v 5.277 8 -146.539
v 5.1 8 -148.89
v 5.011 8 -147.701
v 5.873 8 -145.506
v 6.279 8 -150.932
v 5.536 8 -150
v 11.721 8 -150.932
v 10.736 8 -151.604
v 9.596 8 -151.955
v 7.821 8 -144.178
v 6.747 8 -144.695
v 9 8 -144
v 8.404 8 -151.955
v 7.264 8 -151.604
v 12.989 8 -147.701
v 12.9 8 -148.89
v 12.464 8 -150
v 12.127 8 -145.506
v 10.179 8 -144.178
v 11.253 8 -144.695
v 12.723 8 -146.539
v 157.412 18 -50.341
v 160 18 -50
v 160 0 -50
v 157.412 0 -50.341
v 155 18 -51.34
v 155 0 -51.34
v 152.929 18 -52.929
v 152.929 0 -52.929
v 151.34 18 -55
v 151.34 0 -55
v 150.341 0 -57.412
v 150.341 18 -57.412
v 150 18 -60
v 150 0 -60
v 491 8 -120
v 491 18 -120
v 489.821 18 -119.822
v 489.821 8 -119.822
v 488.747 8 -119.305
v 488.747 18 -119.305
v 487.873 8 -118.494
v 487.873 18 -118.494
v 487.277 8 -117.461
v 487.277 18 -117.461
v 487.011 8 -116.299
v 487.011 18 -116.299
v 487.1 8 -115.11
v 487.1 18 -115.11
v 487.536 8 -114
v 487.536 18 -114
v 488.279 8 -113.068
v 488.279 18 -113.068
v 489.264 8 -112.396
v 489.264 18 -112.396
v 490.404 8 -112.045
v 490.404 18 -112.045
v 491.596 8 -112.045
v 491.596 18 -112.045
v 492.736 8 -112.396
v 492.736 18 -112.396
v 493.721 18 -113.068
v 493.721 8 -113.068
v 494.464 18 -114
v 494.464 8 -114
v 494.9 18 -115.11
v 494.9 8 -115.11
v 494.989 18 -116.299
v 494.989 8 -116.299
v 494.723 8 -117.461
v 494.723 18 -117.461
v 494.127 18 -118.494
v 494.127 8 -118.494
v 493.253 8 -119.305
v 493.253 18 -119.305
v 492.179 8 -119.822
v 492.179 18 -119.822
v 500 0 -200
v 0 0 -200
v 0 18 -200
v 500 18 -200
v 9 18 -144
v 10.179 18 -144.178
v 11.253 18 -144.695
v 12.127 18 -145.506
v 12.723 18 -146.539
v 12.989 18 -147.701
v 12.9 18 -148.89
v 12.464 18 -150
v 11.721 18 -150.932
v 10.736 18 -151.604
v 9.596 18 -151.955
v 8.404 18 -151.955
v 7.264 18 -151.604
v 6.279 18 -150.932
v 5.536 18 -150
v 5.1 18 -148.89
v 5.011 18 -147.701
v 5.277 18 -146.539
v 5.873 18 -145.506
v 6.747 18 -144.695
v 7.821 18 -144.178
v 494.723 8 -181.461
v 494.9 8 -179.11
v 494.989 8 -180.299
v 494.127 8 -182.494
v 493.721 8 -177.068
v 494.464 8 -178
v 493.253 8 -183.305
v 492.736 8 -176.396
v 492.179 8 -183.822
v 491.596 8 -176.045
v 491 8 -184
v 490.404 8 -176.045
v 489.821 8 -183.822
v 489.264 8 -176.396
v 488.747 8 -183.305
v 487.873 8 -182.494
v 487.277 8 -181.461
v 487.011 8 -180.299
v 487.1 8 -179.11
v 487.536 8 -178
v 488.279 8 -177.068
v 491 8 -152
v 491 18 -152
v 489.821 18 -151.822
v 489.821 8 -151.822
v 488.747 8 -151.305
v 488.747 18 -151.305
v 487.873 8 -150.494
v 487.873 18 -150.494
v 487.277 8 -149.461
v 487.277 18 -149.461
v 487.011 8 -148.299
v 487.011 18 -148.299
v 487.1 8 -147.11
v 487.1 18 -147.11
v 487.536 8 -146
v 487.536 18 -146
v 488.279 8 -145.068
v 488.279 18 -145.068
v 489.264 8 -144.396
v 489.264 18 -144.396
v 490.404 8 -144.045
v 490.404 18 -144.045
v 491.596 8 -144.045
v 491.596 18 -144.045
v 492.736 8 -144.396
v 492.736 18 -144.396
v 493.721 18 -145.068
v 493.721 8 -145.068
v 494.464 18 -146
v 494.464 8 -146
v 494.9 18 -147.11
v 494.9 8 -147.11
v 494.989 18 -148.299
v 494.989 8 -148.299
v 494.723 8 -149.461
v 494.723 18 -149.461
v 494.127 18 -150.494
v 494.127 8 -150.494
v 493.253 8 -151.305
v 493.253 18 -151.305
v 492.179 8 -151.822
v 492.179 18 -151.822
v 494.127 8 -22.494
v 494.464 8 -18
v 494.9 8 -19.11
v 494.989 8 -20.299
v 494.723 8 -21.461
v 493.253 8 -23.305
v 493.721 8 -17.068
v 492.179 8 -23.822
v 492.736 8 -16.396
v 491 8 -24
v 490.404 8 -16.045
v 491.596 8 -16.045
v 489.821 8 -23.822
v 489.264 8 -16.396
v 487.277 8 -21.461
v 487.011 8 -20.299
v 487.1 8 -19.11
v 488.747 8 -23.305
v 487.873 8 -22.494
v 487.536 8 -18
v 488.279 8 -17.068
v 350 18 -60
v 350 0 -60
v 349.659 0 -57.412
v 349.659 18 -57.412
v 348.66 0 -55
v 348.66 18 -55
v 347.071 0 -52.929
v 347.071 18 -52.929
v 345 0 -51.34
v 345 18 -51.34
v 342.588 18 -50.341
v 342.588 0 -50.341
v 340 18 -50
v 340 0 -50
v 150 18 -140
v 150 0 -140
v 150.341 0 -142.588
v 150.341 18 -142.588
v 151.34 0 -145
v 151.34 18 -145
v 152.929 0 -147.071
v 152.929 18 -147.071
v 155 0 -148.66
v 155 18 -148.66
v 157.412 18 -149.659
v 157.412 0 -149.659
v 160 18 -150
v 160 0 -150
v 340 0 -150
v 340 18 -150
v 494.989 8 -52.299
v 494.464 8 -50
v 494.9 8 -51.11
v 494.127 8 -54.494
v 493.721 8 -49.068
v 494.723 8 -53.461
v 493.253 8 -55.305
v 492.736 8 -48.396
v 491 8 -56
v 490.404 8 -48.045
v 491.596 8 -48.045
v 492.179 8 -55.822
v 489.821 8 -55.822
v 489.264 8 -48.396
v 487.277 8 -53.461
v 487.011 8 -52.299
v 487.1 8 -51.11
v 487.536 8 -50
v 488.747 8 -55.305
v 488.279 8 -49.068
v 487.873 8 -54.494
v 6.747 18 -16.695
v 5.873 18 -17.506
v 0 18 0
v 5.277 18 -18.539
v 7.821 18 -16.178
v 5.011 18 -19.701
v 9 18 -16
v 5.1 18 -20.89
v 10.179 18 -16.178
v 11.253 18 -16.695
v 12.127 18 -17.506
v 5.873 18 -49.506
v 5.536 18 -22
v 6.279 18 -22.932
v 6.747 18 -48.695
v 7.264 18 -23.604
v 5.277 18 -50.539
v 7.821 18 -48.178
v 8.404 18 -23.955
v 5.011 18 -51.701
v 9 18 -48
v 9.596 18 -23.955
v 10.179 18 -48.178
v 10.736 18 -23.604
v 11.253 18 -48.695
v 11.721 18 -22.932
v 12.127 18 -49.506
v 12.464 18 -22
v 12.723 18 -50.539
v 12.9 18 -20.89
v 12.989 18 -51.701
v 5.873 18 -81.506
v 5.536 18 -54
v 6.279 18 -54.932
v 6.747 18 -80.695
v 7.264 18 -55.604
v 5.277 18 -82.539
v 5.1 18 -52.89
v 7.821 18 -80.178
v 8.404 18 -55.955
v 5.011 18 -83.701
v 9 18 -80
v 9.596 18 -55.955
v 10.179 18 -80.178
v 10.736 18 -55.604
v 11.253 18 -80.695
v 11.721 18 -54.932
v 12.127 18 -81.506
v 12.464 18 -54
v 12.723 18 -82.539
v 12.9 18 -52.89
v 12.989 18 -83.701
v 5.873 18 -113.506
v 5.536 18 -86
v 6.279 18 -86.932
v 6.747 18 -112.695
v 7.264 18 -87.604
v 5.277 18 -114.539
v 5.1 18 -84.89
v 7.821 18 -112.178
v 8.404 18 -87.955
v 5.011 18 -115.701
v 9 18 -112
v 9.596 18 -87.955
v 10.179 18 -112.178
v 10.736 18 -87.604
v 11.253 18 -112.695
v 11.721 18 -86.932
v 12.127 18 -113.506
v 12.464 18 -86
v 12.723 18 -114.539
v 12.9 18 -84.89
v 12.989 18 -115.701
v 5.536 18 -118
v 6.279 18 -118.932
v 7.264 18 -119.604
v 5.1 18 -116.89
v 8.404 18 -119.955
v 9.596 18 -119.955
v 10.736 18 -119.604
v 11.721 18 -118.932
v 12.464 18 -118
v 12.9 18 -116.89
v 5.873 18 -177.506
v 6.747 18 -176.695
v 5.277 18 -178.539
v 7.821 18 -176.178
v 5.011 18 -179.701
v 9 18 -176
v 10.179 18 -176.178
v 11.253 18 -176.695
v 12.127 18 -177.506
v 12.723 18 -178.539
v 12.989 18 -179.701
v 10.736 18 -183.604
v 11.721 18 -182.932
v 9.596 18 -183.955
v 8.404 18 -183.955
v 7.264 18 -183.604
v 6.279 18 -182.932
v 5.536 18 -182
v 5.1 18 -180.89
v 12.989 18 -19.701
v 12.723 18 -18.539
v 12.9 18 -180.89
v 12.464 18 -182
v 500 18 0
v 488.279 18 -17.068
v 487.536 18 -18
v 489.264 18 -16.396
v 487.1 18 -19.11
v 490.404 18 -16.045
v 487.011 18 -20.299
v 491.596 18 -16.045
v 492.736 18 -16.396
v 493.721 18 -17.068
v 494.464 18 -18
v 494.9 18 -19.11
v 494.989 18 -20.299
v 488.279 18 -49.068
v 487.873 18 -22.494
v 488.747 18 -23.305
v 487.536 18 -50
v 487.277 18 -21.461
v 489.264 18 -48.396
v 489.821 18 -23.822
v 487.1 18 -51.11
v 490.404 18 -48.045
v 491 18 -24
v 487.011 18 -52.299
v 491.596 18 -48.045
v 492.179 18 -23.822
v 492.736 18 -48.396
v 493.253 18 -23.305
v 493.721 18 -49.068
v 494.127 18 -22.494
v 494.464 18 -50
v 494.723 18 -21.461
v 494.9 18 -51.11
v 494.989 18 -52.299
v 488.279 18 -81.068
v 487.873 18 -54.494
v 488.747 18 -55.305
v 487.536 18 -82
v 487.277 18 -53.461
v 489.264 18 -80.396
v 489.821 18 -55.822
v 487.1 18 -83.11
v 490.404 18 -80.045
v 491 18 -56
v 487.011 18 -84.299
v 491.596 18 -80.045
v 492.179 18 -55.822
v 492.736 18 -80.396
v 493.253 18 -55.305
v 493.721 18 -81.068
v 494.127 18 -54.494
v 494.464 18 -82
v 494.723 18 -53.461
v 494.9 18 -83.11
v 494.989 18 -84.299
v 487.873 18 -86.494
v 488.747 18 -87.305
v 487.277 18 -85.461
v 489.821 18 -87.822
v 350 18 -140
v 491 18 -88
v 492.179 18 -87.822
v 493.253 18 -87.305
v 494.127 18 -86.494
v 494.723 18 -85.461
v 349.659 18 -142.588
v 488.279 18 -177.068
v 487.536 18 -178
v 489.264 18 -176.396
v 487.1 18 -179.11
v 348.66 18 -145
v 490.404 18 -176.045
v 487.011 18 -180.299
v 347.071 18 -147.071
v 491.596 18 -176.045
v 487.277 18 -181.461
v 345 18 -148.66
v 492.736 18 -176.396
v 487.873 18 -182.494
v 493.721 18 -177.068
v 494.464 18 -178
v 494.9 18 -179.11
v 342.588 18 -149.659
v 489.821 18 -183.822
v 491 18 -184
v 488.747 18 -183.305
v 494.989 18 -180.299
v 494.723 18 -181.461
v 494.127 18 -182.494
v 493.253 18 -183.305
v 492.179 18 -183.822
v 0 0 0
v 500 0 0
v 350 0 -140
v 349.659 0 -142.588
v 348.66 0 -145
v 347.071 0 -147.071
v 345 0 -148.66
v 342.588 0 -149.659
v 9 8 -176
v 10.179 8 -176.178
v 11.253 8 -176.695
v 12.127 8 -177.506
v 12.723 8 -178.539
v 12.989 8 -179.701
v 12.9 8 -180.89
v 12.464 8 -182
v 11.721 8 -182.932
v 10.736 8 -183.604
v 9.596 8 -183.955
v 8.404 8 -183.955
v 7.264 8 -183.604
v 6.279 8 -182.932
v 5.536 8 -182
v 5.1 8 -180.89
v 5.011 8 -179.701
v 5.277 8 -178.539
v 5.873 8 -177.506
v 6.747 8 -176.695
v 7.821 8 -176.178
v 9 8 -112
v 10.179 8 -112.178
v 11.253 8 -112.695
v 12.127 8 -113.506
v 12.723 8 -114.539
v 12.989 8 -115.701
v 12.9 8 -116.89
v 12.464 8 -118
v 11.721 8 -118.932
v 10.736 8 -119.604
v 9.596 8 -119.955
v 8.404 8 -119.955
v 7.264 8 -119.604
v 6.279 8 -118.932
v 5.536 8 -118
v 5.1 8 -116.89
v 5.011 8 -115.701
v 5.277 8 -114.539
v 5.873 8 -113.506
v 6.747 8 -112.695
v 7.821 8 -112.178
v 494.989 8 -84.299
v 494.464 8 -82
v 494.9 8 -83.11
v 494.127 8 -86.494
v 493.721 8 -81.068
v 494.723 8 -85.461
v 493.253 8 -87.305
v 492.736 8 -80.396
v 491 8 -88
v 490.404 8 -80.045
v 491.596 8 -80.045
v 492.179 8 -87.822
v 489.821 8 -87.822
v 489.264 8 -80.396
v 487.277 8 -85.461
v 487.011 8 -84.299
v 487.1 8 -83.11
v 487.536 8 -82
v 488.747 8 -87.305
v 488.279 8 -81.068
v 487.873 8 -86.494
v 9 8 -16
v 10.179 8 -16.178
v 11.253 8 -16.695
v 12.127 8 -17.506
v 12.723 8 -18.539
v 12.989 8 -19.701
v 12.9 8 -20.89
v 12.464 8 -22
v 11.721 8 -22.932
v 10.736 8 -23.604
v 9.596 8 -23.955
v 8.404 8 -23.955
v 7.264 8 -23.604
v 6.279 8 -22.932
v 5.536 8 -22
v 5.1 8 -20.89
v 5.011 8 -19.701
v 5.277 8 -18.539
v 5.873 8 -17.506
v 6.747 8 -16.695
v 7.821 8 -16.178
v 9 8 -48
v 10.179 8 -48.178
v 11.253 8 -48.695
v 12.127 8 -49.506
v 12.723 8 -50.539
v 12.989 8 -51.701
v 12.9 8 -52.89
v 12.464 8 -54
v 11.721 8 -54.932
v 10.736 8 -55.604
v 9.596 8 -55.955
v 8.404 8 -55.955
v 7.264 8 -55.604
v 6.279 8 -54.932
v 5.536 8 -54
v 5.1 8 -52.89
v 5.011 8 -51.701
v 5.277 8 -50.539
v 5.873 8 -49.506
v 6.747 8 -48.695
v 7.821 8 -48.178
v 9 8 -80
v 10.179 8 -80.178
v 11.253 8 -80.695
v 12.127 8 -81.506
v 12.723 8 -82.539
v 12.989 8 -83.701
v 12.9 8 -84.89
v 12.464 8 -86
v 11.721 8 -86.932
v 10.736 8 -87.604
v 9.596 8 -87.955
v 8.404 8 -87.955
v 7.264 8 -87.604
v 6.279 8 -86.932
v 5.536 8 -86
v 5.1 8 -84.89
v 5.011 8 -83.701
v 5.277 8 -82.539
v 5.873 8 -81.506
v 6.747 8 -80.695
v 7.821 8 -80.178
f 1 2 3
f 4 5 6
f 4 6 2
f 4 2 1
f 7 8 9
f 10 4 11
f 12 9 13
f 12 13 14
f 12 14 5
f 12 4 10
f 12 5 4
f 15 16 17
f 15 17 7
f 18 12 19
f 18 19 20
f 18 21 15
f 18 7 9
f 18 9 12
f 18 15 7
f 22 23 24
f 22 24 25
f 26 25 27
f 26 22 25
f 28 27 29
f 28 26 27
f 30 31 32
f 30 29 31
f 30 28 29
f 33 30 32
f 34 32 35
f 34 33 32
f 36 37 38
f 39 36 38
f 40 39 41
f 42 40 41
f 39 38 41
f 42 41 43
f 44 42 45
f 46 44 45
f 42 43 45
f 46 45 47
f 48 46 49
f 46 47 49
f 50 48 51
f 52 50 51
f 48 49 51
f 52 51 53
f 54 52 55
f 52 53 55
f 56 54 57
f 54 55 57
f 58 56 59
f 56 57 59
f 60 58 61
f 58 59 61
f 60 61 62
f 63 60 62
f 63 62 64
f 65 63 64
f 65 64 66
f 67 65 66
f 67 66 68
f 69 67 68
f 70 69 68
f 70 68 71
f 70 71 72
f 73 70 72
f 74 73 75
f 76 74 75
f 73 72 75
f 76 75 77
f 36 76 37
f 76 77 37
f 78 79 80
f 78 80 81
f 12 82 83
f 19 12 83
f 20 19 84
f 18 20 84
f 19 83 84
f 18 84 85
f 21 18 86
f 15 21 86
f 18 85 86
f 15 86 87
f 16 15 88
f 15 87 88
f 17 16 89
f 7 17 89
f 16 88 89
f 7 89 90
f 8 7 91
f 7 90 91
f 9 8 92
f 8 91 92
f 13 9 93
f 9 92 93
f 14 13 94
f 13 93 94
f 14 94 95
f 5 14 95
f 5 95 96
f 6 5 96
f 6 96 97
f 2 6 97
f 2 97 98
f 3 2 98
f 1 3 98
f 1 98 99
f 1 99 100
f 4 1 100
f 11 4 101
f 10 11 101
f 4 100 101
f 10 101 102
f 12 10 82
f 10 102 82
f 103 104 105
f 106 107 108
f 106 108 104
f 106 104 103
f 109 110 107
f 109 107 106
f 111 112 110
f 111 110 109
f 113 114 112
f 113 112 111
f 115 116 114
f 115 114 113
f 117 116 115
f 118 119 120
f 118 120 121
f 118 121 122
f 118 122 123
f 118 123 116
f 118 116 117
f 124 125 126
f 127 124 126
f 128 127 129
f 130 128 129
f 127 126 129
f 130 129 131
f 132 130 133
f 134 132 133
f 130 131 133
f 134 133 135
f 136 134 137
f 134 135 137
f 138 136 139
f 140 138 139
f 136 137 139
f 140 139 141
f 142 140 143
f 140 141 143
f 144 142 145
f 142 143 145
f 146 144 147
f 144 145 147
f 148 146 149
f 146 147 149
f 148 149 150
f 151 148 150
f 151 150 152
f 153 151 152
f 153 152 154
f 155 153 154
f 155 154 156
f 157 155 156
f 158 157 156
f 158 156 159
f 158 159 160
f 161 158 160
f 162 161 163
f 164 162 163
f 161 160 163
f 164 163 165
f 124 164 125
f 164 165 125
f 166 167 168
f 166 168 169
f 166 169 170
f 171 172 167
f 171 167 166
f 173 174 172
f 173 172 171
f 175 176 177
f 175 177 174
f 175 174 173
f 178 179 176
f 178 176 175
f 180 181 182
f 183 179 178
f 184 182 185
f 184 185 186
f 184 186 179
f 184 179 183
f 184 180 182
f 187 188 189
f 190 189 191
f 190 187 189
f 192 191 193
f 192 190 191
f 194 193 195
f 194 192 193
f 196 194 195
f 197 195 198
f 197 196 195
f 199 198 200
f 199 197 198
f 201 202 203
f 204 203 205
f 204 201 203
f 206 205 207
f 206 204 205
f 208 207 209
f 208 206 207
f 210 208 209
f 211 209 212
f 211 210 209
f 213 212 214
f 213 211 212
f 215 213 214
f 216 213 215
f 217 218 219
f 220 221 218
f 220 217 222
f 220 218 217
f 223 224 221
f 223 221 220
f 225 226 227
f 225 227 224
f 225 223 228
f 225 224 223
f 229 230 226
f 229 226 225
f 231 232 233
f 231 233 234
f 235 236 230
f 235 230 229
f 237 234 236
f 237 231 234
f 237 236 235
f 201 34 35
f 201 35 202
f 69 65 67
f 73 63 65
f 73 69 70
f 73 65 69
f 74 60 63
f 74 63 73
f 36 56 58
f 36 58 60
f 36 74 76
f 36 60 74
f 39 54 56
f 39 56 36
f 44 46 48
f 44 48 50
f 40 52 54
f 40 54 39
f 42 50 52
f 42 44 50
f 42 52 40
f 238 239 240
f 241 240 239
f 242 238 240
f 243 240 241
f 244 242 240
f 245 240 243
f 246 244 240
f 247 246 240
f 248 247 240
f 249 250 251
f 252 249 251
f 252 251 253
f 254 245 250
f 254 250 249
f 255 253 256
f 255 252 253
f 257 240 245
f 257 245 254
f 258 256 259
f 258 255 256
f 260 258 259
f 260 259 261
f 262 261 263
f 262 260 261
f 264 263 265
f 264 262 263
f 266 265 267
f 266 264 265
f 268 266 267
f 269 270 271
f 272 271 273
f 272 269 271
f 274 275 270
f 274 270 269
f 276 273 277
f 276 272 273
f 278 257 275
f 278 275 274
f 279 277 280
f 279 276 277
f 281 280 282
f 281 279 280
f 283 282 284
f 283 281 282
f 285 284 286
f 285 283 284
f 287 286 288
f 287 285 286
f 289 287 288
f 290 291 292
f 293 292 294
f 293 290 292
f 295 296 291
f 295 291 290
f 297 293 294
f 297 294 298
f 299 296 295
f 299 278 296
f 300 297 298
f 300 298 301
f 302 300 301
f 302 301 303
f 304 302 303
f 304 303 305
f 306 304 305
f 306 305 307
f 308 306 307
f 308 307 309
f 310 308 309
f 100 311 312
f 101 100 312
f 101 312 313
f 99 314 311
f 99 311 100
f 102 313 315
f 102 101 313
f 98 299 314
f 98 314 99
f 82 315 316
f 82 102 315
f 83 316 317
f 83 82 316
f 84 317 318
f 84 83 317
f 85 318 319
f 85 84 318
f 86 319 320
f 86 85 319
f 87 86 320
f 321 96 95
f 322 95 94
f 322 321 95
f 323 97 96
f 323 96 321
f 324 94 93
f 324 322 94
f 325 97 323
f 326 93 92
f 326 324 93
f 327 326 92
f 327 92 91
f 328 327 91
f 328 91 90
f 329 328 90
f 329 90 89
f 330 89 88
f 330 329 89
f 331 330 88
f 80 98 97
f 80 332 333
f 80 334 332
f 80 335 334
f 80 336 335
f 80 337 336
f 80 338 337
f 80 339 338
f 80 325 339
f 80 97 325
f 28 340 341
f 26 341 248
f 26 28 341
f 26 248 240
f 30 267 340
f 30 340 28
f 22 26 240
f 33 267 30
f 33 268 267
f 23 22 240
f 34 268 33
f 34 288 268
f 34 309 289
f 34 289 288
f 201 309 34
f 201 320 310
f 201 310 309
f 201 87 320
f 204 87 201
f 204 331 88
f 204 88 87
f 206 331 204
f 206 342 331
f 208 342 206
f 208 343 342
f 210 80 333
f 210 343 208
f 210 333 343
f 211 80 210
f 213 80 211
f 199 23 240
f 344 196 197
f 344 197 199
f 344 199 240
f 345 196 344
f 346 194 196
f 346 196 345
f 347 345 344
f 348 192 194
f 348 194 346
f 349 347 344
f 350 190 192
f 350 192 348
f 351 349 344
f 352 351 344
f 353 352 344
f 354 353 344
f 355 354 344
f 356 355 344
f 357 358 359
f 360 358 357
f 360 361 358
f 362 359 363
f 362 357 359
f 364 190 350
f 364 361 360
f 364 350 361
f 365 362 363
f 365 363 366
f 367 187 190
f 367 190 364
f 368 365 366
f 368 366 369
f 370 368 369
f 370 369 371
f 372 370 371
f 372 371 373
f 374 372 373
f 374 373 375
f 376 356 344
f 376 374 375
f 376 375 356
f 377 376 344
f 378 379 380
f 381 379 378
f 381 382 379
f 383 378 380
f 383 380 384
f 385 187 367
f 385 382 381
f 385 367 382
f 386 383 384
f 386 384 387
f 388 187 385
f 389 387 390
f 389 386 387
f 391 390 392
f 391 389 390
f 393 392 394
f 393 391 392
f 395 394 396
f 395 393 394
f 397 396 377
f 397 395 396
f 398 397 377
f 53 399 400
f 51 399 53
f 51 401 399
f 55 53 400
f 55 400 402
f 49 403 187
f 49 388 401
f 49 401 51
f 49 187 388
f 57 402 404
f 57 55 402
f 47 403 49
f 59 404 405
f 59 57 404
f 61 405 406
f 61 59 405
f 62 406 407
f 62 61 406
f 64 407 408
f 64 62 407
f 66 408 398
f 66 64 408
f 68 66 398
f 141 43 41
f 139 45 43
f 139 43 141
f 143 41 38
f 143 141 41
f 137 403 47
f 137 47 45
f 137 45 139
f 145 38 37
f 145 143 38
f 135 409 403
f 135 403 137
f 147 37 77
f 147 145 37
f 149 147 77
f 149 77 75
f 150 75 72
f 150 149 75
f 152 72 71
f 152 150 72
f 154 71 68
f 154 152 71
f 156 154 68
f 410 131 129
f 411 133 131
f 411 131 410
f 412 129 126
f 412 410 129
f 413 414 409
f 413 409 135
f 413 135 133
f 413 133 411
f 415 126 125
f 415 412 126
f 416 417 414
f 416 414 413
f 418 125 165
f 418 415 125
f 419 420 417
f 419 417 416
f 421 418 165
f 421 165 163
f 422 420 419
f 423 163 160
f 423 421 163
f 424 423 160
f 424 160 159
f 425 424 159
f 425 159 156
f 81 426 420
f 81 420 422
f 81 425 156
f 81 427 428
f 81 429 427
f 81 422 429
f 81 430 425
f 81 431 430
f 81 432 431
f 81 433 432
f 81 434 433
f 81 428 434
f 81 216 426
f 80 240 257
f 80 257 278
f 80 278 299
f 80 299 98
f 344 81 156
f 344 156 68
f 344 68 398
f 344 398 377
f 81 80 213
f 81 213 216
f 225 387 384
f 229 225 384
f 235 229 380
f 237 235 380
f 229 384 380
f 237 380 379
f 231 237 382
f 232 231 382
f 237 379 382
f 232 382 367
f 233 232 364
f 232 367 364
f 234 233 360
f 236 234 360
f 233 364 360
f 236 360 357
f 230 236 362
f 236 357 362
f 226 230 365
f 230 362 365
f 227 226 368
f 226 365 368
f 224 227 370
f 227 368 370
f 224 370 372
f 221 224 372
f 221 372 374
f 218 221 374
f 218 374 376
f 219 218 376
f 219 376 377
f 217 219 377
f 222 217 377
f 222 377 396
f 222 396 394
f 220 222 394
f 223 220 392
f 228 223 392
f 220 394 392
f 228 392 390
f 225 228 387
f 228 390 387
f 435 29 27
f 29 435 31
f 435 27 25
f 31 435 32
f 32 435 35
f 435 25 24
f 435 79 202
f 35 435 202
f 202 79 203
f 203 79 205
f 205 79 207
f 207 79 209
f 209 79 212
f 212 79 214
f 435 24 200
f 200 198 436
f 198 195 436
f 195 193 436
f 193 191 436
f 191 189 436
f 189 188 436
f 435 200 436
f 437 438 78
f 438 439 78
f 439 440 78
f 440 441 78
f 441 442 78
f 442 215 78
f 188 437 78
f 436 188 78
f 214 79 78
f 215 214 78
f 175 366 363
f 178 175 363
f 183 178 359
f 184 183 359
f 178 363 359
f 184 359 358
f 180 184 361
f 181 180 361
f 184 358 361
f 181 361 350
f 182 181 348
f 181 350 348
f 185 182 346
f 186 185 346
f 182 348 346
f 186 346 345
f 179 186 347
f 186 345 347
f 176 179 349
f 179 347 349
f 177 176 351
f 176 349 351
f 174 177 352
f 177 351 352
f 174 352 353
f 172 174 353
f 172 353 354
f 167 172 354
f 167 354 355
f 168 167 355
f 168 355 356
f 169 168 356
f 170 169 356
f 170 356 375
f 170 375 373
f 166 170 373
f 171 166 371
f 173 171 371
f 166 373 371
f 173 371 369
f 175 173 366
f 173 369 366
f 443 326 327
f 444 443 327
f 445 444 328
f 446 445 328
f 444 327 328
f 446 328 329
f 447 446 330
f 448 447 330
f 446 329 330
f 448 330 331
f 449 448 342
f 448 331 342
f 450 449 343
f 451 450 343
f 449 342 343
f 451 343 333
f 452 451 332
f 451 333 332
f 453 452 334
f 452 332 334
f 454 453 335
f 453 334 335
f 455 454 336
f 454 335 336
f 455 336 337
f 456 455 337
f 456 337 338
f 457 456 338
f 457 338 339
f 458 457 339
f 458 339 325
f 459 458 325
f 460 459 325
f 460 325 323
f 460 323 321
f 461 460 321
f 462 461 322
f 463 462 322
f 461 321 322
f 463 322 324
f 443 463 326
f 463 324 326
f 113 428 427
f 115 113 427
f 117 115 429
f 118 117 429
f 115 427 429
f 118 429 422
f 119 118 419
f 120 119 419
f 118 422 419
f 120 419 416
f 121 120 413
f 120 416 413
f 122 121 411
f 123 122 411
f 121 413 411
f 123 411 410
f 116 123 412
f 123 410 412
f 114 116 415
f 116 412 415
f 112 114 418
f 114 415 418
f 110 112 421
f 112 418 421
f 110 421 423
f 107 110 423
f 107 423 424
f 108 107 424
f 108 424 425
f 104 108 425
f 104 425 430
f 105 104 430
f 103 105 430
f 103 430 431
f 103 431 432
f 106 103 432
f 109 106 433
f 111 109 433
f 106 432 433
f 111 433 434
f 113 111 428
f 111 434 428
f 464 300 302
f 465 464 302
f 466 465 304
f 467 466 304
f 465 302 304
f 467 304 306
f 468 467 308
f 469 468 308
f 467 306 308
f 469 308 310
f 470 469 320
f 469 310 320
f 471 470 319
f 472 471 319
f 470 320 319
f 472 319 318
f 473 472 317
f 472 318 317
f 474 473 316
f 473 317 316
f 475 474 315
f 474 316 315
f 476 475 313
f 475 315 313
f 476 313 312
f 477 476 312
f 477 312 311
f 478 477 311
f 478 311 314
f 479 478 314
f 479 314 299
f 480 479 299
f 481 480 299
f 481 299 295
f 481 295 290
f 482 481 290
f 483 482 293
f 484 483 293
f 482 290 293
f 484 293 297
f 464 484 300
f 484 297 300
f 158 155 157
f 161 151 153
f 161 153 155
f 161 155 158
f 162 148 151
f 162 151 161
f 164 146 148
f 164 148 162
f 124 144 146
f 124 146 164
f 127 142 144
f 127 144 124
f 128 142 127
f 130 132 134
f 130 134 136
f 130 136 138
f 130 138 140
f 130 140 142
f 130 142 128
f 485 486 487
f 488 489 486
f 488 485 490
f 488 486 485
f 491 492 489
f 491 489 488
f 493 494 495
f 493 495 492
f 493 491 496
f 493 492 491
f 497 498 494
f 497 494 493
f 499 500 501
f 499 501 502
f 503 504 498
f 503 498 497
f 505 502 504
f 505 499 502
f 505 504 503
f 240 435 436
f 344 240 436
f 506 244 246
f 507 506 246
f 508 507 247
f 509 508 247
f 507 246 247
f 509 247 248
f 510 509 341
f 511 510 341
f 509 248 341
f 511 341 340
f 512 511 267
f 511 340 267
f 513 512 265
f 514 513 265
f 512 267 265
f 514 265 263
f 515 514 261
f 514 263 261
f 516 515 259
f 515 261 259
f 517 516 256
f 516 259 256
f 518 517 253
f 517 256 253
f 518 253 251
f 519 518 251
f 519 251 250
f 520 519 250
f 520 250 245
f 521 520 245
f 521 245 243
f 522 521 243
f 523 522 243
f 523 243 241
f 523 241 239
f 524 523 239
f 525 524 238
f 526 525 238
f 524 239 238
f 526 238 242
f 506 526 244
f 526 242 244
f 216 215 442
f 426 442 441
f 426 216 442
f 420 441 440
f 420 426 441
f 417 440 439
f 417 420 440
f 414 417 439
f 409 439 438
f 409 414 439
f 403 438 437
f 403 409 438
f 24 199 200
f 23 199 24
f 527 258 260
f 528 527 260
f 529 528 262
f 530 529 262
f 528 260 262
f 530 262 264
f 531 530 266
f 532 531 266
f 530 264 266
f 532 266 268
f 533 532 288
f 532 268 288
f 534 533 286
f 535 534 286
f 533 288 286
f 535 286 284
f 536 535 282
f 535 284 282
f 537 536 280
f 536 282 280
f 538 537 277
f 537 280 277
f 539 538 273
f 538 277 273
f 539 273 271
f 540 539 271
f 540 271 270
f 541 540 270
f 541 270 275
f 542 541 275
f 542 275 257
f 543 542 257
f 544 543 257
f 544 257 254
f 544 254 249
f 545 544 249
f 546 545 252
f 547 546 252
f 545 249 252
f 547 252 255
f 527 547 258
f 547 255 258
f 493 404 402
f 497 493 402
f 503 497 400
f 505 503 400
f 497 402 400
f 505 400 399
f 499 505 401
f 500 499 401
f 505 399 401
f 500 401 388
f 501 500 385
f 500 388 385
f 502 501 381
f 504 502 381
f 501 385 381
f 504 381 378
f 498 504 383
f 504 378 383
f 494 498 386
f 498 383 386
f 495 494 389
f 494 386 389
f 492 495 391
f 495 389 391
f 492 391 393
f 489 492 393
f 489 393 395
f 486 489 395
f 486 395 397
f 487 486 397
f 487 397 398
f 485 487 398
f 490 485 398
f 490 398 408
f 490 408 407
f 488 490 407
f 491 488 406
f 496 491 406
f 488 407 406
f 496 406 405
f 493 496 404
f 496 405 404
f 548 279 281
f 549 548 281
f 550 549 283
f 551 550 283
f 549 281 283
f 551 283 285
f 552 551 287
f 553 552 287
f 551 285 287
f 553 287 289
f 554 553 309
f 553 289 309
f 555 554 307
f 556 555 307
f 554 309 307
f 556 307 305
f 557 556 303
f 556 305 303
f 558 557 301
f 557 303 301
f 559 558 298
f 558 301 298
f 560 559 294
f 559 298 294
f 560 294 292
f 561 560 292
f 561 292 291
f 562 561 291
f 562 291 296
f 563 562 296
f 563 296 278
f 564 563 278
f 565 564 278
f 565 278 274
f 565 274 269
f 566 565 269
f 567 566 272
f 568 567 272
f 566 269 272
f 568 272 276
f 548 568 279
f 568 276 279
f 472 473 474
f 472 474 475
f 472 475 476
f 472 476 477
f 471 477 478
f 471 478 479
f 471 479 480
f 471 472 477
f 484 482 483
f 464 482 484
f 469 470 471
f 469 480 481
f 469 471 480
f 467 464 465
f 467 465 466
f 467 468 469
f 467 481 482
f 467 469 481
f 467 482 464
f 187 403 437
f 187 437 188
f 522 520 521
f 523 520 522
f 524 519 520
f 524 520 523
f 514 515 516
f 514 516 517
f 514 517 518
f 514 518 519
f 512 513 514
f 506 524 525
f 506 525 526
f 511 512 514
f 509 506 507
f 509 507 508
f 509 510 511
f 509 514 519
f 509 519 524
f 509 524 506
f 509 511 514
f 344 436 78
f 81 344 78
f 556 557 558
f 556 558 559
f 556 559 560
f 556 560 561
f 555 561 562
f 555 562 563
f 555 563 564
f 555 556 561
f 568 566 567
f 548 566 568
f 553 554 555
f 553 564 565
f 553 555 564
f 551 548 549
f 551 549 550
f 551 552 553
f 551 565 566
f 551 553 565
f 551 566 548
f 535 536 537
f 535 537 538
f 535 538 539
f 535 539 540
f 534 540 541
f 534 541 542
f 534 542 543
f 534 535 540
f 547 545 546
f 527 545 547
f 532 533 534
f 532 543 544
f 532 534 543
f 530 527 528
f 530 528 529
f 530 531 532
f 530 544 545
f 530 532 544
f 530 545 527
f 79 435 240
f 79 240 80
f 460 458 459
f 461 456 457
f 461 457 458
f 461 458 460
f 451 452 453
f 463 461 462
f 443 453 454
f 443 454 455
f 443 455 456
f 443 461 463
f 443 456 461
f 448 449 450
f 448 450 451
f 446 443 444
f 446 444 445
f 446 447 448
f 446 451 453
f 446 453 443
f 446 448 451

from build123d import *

# Parameters (mm, degrees)
SKETCH1_W           = 500
SKETCH1_H           = 200
BOSS_EXTRUDE1_DEPTH = 18
SKETCH2_R           = 4
CUT_EXTRUDE1_DEPTH  = 10
CUT_EXTRUDE2_DEPTH  = 30


with BuildPart() as part:
    # Sketch1 → Boss-Extrude1 (new body)
    with BuildSketch(Plane(origin=(0, 0, 0), x_dir=(1, 0, 0), z_dir=(0, 1, 0))):
        with Locations((250, 100)):
            Rectangle(SKETCH1_W, SKETCH1_H)
    extrude(amount=BOSS_EXTRUDE1_DEPTH)

    # Sketch2 → Cut-Extrude1 (cut)
    with BuildSketch(Plane(origin=(0, 18, 0), x_dir=(1, 0, 0), z_dir=(0, 1, 0))):
        with Locations(Location((9, 180, 0), (0, 0, 270))):
            Circle(SKETCH2_R)
        with Locations(Location((9, 148, 0), (0, 0, 270))):
            Circle(SKETCH2_R)
        with Locations(Location((9, 116, 0), (0, 0, 270))):
            Circle(SKETCH2_R)
        with Locations(Location((9, 84, 0), (0, 0, 270))):
            Circle(SKETCH2_R)
        with Locations(Location((9, 52, 0), (0, 0, 270))):
            Circle(SKETCH2_R)
        with Locations(Location((9, 20, 0), (0, 0, 270))):
            Circle(SKETCH2_R)
        with Locations(Location((491, 20, 0), (0, 0, 90))):
            Circle(SKETCH2_R)
        with Locations(Location((491, 52, 0), (0, 0, 90))):
            Circle(SKETCH2_R)
        with Locations(Location((491, 84, 0), (0, 0, 90))):
            Circle(SKETCH2_R)
        with Locations(Location((491, 116, 0), (0, 0, 90))):
            Circle(SKETCH2_R)
        with Locations(Location((491, 148, 0), (0, 0, 90))):
            Circle(SKETCH2_R)
        with Locations(Location((491, 180, 0), (0, 0, 90))):
            Circle(SKETCH2_R)
    extrude(amount=-CUT_EXTRUDE1_DEPTH, mode=Mode.SUBTRACT)

    # Sketch3 → Cut-Extrude2 (cut)
    with BuildSketch(Plane(origin=(0, 18, 0), x_dir=(1, 0, 0), z_dir=(0, 1, 0))):
        with BuildLine():
            Line((160, 150), (340, 150))
            ThreePointArc((340, 150), (347.071067812, 147.071067812), (350, 140))
            Line((350, 140), (350, 60))
            ThreePointArc((350, 60), (347.071067812, 52.928932188), (340, 50))
            Line((340, 50), (160, 50))
            ThreePointArc((160, 50), (152.928932188, 52.928932188), (150, 60))
            Line((150, 60), (150, 140))
            ThreePointArc((150, 140), (152.928932188, 147.071067812), (160, 150))
        make_face()
    extrude(amount=-CUT_EXTRUDE2_DEPTH, mode=Mode.SUBTRACT)


solid = part.part
